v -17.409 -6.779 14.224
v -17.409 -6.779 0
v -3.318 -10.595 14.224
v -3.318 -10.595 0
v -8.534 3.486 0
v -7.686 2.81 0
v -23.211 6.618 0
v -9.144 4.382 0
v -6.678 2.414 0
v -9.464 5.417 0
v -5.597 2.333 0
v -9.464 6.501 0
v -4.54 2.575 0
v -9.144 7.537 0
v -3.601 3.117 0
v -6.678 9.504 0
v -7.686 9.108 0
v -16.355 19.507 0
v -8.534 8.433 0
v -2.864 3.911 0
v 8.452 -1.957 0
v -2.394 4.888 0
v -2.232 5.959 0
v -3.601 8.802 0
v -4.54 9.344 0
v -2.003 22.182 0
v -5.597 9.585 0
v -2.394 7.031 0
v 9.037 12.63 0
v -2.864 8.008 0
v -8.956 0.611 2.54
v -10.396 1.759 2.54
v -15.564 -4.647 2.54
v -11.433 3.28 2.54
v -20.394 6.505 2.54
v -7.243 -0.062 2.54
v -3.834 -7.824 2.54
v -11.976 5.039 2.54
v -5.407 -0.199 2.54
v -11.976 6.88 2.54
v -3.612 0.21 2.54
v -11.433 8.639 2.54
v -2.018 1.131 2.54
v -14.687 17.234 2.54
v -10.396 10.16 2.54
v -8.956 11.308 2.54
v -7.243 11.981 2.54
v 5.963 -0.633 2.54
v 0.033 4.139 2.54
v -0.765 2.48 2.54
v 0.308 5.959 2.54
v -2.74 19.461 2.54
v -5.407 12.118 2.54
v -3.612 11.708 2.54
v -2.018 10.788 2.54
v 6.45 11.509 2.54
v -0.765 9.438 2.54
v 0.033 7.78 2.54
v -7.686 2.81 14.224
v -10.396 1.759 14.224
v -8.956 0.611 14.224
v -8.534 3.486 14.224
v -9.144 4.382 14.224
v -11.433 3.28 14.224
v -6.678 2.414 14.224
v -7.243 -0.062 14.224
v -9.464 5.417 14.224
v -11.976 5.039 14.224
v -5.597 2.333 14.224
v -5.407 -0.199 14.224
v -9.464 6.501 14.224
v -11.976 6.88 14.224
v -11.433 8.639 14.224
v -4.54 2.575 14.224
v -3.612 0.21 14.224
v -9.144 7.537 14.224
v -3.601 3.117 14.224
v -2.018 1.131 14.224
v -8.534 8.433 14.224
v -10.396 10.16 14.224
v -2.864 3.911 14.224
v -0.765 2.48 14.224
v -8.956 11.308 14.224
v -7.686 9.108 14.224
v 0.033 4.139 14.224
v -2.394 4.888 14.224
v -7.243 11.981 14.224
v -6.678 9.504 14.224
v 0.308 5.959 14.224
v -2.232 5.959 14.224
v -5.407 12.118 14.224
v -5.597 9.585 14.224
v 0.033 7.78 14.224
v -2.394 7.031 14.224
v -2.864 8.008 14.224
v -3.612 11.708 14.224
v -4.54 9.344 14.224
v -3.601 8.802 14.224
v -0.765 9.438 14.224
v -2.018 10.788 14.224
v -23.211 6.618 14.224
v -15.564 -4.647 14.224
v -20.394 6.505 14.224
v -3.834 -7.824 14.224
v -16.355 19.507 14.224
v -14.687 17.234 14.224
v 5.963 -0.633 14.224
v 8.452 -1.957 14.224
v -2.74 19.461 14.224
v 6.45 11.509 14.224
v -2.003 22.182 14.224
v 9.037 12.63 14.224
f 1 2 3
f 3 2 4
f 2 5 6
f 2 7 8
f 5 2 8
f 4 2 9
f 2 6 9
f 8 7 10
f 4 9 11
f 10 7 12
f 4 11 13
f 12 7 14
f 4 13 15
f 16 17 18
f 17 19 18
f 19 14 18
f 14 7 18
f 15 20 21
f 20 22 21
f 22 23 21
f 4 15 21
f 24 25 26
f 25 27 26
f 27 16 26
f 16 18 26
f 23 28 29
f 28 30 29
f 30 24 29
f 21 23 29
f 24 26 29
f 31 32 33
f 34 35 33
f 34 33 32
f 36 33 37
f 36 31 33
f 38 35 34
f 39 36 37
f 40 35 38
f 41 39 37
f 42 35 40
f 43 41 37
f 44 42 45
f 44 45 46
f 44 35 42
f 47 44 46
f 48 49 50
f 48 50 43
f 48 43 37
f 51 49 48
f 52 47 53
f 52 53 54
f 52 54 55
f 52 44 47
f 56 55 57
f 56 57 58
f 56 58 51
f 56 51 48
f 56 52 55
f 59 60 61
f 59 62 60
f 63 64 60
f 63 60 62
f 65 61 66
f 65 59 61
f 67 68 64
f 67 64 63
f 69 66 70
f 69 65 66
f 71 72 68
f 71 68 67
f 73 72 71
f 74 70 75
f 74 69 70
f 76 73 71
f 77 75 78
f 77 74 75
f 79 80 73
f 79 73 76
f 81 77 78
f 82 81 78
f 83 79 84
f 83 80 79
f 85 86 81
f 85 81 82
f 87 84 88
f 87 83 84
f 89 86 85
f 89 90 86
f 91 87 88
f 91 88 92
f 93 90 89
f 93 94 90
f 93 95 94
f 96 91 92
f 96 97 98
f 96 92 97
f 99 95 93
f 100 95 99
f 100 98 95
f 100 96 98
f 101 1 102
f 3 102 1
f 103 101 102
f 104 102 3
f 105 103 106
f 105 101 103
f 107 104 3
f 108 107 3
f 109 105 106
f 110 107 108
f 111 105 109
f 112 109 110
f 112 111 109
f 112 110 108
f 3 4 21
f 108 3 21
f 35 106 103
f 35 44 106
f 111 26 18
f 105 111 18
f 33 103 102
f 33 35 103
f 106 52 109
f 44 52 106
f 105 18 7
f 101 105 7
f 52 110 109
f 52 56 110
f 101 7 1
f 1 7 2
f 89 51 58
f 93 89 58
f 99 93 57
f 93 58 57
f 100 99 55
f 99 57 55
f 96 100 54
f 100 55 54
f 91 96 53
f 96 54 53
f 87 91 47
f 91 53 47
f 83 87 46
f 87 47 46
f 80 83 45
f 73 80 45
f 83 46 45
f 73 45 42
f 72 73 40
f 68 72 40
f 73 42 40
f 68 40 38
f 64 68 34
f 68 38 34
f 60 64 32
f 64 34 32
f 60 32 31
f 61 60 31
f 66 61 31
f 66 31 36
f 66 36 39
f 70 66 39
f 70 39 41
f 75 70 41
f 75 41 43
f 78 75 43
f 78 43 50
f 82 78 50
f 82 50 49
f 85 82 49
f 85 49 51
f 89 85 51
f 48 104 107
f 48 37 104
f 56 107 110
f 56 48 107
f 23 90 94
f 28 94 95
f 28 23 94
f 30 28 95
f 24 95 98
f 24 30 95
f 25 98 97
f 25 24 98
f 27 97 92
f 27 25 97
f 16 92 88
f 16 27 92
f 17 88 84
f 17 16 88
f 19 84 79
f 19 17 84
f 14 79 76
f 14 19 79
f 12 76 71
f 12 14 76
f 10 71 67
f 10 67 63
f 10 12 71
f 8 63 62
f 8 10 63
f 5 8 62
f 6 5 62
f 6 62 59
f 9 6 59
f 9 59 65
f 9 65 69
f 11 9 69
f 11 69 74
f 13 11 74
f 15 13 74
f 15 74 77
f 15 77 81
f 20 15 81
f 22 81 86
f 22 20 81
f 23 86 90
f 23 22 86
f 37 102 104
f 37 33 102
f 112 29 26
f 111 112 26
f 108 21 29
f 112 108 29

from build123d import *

# Parameters (mm, degrees)
F0_R     = 3.636094
F1_DEPTH = 14.224
F2_T     = -2.54


with BuildPart() as f1:
    # F0 (on Top) → F1 (new body)
    with BuildSketch(Plane.XY):
        Polygon((-17.40883, -6.778608), (-3.317572, -10.594991), (8.451953, -1.957478), (9.037052, 12.629708), (-2.002867, 22.182119), (-16.354518, 19.506593), (-23.210817, 6.617858), align=None)
        with Locations((-5.8684, 5.959329)):
            Circle(F0_R, mode=Mode.SUBTRACT)
    extrude(amount=F1_DEPTH)

    # F2
    f2_openings = [f1.faces().sort_by_distance(p)[0] for p in [
        (-10.242999, -8.242978, 14.224),
    ]]
    offset(amount=F2_T, openings=f2_openings)


solid = f1.part
